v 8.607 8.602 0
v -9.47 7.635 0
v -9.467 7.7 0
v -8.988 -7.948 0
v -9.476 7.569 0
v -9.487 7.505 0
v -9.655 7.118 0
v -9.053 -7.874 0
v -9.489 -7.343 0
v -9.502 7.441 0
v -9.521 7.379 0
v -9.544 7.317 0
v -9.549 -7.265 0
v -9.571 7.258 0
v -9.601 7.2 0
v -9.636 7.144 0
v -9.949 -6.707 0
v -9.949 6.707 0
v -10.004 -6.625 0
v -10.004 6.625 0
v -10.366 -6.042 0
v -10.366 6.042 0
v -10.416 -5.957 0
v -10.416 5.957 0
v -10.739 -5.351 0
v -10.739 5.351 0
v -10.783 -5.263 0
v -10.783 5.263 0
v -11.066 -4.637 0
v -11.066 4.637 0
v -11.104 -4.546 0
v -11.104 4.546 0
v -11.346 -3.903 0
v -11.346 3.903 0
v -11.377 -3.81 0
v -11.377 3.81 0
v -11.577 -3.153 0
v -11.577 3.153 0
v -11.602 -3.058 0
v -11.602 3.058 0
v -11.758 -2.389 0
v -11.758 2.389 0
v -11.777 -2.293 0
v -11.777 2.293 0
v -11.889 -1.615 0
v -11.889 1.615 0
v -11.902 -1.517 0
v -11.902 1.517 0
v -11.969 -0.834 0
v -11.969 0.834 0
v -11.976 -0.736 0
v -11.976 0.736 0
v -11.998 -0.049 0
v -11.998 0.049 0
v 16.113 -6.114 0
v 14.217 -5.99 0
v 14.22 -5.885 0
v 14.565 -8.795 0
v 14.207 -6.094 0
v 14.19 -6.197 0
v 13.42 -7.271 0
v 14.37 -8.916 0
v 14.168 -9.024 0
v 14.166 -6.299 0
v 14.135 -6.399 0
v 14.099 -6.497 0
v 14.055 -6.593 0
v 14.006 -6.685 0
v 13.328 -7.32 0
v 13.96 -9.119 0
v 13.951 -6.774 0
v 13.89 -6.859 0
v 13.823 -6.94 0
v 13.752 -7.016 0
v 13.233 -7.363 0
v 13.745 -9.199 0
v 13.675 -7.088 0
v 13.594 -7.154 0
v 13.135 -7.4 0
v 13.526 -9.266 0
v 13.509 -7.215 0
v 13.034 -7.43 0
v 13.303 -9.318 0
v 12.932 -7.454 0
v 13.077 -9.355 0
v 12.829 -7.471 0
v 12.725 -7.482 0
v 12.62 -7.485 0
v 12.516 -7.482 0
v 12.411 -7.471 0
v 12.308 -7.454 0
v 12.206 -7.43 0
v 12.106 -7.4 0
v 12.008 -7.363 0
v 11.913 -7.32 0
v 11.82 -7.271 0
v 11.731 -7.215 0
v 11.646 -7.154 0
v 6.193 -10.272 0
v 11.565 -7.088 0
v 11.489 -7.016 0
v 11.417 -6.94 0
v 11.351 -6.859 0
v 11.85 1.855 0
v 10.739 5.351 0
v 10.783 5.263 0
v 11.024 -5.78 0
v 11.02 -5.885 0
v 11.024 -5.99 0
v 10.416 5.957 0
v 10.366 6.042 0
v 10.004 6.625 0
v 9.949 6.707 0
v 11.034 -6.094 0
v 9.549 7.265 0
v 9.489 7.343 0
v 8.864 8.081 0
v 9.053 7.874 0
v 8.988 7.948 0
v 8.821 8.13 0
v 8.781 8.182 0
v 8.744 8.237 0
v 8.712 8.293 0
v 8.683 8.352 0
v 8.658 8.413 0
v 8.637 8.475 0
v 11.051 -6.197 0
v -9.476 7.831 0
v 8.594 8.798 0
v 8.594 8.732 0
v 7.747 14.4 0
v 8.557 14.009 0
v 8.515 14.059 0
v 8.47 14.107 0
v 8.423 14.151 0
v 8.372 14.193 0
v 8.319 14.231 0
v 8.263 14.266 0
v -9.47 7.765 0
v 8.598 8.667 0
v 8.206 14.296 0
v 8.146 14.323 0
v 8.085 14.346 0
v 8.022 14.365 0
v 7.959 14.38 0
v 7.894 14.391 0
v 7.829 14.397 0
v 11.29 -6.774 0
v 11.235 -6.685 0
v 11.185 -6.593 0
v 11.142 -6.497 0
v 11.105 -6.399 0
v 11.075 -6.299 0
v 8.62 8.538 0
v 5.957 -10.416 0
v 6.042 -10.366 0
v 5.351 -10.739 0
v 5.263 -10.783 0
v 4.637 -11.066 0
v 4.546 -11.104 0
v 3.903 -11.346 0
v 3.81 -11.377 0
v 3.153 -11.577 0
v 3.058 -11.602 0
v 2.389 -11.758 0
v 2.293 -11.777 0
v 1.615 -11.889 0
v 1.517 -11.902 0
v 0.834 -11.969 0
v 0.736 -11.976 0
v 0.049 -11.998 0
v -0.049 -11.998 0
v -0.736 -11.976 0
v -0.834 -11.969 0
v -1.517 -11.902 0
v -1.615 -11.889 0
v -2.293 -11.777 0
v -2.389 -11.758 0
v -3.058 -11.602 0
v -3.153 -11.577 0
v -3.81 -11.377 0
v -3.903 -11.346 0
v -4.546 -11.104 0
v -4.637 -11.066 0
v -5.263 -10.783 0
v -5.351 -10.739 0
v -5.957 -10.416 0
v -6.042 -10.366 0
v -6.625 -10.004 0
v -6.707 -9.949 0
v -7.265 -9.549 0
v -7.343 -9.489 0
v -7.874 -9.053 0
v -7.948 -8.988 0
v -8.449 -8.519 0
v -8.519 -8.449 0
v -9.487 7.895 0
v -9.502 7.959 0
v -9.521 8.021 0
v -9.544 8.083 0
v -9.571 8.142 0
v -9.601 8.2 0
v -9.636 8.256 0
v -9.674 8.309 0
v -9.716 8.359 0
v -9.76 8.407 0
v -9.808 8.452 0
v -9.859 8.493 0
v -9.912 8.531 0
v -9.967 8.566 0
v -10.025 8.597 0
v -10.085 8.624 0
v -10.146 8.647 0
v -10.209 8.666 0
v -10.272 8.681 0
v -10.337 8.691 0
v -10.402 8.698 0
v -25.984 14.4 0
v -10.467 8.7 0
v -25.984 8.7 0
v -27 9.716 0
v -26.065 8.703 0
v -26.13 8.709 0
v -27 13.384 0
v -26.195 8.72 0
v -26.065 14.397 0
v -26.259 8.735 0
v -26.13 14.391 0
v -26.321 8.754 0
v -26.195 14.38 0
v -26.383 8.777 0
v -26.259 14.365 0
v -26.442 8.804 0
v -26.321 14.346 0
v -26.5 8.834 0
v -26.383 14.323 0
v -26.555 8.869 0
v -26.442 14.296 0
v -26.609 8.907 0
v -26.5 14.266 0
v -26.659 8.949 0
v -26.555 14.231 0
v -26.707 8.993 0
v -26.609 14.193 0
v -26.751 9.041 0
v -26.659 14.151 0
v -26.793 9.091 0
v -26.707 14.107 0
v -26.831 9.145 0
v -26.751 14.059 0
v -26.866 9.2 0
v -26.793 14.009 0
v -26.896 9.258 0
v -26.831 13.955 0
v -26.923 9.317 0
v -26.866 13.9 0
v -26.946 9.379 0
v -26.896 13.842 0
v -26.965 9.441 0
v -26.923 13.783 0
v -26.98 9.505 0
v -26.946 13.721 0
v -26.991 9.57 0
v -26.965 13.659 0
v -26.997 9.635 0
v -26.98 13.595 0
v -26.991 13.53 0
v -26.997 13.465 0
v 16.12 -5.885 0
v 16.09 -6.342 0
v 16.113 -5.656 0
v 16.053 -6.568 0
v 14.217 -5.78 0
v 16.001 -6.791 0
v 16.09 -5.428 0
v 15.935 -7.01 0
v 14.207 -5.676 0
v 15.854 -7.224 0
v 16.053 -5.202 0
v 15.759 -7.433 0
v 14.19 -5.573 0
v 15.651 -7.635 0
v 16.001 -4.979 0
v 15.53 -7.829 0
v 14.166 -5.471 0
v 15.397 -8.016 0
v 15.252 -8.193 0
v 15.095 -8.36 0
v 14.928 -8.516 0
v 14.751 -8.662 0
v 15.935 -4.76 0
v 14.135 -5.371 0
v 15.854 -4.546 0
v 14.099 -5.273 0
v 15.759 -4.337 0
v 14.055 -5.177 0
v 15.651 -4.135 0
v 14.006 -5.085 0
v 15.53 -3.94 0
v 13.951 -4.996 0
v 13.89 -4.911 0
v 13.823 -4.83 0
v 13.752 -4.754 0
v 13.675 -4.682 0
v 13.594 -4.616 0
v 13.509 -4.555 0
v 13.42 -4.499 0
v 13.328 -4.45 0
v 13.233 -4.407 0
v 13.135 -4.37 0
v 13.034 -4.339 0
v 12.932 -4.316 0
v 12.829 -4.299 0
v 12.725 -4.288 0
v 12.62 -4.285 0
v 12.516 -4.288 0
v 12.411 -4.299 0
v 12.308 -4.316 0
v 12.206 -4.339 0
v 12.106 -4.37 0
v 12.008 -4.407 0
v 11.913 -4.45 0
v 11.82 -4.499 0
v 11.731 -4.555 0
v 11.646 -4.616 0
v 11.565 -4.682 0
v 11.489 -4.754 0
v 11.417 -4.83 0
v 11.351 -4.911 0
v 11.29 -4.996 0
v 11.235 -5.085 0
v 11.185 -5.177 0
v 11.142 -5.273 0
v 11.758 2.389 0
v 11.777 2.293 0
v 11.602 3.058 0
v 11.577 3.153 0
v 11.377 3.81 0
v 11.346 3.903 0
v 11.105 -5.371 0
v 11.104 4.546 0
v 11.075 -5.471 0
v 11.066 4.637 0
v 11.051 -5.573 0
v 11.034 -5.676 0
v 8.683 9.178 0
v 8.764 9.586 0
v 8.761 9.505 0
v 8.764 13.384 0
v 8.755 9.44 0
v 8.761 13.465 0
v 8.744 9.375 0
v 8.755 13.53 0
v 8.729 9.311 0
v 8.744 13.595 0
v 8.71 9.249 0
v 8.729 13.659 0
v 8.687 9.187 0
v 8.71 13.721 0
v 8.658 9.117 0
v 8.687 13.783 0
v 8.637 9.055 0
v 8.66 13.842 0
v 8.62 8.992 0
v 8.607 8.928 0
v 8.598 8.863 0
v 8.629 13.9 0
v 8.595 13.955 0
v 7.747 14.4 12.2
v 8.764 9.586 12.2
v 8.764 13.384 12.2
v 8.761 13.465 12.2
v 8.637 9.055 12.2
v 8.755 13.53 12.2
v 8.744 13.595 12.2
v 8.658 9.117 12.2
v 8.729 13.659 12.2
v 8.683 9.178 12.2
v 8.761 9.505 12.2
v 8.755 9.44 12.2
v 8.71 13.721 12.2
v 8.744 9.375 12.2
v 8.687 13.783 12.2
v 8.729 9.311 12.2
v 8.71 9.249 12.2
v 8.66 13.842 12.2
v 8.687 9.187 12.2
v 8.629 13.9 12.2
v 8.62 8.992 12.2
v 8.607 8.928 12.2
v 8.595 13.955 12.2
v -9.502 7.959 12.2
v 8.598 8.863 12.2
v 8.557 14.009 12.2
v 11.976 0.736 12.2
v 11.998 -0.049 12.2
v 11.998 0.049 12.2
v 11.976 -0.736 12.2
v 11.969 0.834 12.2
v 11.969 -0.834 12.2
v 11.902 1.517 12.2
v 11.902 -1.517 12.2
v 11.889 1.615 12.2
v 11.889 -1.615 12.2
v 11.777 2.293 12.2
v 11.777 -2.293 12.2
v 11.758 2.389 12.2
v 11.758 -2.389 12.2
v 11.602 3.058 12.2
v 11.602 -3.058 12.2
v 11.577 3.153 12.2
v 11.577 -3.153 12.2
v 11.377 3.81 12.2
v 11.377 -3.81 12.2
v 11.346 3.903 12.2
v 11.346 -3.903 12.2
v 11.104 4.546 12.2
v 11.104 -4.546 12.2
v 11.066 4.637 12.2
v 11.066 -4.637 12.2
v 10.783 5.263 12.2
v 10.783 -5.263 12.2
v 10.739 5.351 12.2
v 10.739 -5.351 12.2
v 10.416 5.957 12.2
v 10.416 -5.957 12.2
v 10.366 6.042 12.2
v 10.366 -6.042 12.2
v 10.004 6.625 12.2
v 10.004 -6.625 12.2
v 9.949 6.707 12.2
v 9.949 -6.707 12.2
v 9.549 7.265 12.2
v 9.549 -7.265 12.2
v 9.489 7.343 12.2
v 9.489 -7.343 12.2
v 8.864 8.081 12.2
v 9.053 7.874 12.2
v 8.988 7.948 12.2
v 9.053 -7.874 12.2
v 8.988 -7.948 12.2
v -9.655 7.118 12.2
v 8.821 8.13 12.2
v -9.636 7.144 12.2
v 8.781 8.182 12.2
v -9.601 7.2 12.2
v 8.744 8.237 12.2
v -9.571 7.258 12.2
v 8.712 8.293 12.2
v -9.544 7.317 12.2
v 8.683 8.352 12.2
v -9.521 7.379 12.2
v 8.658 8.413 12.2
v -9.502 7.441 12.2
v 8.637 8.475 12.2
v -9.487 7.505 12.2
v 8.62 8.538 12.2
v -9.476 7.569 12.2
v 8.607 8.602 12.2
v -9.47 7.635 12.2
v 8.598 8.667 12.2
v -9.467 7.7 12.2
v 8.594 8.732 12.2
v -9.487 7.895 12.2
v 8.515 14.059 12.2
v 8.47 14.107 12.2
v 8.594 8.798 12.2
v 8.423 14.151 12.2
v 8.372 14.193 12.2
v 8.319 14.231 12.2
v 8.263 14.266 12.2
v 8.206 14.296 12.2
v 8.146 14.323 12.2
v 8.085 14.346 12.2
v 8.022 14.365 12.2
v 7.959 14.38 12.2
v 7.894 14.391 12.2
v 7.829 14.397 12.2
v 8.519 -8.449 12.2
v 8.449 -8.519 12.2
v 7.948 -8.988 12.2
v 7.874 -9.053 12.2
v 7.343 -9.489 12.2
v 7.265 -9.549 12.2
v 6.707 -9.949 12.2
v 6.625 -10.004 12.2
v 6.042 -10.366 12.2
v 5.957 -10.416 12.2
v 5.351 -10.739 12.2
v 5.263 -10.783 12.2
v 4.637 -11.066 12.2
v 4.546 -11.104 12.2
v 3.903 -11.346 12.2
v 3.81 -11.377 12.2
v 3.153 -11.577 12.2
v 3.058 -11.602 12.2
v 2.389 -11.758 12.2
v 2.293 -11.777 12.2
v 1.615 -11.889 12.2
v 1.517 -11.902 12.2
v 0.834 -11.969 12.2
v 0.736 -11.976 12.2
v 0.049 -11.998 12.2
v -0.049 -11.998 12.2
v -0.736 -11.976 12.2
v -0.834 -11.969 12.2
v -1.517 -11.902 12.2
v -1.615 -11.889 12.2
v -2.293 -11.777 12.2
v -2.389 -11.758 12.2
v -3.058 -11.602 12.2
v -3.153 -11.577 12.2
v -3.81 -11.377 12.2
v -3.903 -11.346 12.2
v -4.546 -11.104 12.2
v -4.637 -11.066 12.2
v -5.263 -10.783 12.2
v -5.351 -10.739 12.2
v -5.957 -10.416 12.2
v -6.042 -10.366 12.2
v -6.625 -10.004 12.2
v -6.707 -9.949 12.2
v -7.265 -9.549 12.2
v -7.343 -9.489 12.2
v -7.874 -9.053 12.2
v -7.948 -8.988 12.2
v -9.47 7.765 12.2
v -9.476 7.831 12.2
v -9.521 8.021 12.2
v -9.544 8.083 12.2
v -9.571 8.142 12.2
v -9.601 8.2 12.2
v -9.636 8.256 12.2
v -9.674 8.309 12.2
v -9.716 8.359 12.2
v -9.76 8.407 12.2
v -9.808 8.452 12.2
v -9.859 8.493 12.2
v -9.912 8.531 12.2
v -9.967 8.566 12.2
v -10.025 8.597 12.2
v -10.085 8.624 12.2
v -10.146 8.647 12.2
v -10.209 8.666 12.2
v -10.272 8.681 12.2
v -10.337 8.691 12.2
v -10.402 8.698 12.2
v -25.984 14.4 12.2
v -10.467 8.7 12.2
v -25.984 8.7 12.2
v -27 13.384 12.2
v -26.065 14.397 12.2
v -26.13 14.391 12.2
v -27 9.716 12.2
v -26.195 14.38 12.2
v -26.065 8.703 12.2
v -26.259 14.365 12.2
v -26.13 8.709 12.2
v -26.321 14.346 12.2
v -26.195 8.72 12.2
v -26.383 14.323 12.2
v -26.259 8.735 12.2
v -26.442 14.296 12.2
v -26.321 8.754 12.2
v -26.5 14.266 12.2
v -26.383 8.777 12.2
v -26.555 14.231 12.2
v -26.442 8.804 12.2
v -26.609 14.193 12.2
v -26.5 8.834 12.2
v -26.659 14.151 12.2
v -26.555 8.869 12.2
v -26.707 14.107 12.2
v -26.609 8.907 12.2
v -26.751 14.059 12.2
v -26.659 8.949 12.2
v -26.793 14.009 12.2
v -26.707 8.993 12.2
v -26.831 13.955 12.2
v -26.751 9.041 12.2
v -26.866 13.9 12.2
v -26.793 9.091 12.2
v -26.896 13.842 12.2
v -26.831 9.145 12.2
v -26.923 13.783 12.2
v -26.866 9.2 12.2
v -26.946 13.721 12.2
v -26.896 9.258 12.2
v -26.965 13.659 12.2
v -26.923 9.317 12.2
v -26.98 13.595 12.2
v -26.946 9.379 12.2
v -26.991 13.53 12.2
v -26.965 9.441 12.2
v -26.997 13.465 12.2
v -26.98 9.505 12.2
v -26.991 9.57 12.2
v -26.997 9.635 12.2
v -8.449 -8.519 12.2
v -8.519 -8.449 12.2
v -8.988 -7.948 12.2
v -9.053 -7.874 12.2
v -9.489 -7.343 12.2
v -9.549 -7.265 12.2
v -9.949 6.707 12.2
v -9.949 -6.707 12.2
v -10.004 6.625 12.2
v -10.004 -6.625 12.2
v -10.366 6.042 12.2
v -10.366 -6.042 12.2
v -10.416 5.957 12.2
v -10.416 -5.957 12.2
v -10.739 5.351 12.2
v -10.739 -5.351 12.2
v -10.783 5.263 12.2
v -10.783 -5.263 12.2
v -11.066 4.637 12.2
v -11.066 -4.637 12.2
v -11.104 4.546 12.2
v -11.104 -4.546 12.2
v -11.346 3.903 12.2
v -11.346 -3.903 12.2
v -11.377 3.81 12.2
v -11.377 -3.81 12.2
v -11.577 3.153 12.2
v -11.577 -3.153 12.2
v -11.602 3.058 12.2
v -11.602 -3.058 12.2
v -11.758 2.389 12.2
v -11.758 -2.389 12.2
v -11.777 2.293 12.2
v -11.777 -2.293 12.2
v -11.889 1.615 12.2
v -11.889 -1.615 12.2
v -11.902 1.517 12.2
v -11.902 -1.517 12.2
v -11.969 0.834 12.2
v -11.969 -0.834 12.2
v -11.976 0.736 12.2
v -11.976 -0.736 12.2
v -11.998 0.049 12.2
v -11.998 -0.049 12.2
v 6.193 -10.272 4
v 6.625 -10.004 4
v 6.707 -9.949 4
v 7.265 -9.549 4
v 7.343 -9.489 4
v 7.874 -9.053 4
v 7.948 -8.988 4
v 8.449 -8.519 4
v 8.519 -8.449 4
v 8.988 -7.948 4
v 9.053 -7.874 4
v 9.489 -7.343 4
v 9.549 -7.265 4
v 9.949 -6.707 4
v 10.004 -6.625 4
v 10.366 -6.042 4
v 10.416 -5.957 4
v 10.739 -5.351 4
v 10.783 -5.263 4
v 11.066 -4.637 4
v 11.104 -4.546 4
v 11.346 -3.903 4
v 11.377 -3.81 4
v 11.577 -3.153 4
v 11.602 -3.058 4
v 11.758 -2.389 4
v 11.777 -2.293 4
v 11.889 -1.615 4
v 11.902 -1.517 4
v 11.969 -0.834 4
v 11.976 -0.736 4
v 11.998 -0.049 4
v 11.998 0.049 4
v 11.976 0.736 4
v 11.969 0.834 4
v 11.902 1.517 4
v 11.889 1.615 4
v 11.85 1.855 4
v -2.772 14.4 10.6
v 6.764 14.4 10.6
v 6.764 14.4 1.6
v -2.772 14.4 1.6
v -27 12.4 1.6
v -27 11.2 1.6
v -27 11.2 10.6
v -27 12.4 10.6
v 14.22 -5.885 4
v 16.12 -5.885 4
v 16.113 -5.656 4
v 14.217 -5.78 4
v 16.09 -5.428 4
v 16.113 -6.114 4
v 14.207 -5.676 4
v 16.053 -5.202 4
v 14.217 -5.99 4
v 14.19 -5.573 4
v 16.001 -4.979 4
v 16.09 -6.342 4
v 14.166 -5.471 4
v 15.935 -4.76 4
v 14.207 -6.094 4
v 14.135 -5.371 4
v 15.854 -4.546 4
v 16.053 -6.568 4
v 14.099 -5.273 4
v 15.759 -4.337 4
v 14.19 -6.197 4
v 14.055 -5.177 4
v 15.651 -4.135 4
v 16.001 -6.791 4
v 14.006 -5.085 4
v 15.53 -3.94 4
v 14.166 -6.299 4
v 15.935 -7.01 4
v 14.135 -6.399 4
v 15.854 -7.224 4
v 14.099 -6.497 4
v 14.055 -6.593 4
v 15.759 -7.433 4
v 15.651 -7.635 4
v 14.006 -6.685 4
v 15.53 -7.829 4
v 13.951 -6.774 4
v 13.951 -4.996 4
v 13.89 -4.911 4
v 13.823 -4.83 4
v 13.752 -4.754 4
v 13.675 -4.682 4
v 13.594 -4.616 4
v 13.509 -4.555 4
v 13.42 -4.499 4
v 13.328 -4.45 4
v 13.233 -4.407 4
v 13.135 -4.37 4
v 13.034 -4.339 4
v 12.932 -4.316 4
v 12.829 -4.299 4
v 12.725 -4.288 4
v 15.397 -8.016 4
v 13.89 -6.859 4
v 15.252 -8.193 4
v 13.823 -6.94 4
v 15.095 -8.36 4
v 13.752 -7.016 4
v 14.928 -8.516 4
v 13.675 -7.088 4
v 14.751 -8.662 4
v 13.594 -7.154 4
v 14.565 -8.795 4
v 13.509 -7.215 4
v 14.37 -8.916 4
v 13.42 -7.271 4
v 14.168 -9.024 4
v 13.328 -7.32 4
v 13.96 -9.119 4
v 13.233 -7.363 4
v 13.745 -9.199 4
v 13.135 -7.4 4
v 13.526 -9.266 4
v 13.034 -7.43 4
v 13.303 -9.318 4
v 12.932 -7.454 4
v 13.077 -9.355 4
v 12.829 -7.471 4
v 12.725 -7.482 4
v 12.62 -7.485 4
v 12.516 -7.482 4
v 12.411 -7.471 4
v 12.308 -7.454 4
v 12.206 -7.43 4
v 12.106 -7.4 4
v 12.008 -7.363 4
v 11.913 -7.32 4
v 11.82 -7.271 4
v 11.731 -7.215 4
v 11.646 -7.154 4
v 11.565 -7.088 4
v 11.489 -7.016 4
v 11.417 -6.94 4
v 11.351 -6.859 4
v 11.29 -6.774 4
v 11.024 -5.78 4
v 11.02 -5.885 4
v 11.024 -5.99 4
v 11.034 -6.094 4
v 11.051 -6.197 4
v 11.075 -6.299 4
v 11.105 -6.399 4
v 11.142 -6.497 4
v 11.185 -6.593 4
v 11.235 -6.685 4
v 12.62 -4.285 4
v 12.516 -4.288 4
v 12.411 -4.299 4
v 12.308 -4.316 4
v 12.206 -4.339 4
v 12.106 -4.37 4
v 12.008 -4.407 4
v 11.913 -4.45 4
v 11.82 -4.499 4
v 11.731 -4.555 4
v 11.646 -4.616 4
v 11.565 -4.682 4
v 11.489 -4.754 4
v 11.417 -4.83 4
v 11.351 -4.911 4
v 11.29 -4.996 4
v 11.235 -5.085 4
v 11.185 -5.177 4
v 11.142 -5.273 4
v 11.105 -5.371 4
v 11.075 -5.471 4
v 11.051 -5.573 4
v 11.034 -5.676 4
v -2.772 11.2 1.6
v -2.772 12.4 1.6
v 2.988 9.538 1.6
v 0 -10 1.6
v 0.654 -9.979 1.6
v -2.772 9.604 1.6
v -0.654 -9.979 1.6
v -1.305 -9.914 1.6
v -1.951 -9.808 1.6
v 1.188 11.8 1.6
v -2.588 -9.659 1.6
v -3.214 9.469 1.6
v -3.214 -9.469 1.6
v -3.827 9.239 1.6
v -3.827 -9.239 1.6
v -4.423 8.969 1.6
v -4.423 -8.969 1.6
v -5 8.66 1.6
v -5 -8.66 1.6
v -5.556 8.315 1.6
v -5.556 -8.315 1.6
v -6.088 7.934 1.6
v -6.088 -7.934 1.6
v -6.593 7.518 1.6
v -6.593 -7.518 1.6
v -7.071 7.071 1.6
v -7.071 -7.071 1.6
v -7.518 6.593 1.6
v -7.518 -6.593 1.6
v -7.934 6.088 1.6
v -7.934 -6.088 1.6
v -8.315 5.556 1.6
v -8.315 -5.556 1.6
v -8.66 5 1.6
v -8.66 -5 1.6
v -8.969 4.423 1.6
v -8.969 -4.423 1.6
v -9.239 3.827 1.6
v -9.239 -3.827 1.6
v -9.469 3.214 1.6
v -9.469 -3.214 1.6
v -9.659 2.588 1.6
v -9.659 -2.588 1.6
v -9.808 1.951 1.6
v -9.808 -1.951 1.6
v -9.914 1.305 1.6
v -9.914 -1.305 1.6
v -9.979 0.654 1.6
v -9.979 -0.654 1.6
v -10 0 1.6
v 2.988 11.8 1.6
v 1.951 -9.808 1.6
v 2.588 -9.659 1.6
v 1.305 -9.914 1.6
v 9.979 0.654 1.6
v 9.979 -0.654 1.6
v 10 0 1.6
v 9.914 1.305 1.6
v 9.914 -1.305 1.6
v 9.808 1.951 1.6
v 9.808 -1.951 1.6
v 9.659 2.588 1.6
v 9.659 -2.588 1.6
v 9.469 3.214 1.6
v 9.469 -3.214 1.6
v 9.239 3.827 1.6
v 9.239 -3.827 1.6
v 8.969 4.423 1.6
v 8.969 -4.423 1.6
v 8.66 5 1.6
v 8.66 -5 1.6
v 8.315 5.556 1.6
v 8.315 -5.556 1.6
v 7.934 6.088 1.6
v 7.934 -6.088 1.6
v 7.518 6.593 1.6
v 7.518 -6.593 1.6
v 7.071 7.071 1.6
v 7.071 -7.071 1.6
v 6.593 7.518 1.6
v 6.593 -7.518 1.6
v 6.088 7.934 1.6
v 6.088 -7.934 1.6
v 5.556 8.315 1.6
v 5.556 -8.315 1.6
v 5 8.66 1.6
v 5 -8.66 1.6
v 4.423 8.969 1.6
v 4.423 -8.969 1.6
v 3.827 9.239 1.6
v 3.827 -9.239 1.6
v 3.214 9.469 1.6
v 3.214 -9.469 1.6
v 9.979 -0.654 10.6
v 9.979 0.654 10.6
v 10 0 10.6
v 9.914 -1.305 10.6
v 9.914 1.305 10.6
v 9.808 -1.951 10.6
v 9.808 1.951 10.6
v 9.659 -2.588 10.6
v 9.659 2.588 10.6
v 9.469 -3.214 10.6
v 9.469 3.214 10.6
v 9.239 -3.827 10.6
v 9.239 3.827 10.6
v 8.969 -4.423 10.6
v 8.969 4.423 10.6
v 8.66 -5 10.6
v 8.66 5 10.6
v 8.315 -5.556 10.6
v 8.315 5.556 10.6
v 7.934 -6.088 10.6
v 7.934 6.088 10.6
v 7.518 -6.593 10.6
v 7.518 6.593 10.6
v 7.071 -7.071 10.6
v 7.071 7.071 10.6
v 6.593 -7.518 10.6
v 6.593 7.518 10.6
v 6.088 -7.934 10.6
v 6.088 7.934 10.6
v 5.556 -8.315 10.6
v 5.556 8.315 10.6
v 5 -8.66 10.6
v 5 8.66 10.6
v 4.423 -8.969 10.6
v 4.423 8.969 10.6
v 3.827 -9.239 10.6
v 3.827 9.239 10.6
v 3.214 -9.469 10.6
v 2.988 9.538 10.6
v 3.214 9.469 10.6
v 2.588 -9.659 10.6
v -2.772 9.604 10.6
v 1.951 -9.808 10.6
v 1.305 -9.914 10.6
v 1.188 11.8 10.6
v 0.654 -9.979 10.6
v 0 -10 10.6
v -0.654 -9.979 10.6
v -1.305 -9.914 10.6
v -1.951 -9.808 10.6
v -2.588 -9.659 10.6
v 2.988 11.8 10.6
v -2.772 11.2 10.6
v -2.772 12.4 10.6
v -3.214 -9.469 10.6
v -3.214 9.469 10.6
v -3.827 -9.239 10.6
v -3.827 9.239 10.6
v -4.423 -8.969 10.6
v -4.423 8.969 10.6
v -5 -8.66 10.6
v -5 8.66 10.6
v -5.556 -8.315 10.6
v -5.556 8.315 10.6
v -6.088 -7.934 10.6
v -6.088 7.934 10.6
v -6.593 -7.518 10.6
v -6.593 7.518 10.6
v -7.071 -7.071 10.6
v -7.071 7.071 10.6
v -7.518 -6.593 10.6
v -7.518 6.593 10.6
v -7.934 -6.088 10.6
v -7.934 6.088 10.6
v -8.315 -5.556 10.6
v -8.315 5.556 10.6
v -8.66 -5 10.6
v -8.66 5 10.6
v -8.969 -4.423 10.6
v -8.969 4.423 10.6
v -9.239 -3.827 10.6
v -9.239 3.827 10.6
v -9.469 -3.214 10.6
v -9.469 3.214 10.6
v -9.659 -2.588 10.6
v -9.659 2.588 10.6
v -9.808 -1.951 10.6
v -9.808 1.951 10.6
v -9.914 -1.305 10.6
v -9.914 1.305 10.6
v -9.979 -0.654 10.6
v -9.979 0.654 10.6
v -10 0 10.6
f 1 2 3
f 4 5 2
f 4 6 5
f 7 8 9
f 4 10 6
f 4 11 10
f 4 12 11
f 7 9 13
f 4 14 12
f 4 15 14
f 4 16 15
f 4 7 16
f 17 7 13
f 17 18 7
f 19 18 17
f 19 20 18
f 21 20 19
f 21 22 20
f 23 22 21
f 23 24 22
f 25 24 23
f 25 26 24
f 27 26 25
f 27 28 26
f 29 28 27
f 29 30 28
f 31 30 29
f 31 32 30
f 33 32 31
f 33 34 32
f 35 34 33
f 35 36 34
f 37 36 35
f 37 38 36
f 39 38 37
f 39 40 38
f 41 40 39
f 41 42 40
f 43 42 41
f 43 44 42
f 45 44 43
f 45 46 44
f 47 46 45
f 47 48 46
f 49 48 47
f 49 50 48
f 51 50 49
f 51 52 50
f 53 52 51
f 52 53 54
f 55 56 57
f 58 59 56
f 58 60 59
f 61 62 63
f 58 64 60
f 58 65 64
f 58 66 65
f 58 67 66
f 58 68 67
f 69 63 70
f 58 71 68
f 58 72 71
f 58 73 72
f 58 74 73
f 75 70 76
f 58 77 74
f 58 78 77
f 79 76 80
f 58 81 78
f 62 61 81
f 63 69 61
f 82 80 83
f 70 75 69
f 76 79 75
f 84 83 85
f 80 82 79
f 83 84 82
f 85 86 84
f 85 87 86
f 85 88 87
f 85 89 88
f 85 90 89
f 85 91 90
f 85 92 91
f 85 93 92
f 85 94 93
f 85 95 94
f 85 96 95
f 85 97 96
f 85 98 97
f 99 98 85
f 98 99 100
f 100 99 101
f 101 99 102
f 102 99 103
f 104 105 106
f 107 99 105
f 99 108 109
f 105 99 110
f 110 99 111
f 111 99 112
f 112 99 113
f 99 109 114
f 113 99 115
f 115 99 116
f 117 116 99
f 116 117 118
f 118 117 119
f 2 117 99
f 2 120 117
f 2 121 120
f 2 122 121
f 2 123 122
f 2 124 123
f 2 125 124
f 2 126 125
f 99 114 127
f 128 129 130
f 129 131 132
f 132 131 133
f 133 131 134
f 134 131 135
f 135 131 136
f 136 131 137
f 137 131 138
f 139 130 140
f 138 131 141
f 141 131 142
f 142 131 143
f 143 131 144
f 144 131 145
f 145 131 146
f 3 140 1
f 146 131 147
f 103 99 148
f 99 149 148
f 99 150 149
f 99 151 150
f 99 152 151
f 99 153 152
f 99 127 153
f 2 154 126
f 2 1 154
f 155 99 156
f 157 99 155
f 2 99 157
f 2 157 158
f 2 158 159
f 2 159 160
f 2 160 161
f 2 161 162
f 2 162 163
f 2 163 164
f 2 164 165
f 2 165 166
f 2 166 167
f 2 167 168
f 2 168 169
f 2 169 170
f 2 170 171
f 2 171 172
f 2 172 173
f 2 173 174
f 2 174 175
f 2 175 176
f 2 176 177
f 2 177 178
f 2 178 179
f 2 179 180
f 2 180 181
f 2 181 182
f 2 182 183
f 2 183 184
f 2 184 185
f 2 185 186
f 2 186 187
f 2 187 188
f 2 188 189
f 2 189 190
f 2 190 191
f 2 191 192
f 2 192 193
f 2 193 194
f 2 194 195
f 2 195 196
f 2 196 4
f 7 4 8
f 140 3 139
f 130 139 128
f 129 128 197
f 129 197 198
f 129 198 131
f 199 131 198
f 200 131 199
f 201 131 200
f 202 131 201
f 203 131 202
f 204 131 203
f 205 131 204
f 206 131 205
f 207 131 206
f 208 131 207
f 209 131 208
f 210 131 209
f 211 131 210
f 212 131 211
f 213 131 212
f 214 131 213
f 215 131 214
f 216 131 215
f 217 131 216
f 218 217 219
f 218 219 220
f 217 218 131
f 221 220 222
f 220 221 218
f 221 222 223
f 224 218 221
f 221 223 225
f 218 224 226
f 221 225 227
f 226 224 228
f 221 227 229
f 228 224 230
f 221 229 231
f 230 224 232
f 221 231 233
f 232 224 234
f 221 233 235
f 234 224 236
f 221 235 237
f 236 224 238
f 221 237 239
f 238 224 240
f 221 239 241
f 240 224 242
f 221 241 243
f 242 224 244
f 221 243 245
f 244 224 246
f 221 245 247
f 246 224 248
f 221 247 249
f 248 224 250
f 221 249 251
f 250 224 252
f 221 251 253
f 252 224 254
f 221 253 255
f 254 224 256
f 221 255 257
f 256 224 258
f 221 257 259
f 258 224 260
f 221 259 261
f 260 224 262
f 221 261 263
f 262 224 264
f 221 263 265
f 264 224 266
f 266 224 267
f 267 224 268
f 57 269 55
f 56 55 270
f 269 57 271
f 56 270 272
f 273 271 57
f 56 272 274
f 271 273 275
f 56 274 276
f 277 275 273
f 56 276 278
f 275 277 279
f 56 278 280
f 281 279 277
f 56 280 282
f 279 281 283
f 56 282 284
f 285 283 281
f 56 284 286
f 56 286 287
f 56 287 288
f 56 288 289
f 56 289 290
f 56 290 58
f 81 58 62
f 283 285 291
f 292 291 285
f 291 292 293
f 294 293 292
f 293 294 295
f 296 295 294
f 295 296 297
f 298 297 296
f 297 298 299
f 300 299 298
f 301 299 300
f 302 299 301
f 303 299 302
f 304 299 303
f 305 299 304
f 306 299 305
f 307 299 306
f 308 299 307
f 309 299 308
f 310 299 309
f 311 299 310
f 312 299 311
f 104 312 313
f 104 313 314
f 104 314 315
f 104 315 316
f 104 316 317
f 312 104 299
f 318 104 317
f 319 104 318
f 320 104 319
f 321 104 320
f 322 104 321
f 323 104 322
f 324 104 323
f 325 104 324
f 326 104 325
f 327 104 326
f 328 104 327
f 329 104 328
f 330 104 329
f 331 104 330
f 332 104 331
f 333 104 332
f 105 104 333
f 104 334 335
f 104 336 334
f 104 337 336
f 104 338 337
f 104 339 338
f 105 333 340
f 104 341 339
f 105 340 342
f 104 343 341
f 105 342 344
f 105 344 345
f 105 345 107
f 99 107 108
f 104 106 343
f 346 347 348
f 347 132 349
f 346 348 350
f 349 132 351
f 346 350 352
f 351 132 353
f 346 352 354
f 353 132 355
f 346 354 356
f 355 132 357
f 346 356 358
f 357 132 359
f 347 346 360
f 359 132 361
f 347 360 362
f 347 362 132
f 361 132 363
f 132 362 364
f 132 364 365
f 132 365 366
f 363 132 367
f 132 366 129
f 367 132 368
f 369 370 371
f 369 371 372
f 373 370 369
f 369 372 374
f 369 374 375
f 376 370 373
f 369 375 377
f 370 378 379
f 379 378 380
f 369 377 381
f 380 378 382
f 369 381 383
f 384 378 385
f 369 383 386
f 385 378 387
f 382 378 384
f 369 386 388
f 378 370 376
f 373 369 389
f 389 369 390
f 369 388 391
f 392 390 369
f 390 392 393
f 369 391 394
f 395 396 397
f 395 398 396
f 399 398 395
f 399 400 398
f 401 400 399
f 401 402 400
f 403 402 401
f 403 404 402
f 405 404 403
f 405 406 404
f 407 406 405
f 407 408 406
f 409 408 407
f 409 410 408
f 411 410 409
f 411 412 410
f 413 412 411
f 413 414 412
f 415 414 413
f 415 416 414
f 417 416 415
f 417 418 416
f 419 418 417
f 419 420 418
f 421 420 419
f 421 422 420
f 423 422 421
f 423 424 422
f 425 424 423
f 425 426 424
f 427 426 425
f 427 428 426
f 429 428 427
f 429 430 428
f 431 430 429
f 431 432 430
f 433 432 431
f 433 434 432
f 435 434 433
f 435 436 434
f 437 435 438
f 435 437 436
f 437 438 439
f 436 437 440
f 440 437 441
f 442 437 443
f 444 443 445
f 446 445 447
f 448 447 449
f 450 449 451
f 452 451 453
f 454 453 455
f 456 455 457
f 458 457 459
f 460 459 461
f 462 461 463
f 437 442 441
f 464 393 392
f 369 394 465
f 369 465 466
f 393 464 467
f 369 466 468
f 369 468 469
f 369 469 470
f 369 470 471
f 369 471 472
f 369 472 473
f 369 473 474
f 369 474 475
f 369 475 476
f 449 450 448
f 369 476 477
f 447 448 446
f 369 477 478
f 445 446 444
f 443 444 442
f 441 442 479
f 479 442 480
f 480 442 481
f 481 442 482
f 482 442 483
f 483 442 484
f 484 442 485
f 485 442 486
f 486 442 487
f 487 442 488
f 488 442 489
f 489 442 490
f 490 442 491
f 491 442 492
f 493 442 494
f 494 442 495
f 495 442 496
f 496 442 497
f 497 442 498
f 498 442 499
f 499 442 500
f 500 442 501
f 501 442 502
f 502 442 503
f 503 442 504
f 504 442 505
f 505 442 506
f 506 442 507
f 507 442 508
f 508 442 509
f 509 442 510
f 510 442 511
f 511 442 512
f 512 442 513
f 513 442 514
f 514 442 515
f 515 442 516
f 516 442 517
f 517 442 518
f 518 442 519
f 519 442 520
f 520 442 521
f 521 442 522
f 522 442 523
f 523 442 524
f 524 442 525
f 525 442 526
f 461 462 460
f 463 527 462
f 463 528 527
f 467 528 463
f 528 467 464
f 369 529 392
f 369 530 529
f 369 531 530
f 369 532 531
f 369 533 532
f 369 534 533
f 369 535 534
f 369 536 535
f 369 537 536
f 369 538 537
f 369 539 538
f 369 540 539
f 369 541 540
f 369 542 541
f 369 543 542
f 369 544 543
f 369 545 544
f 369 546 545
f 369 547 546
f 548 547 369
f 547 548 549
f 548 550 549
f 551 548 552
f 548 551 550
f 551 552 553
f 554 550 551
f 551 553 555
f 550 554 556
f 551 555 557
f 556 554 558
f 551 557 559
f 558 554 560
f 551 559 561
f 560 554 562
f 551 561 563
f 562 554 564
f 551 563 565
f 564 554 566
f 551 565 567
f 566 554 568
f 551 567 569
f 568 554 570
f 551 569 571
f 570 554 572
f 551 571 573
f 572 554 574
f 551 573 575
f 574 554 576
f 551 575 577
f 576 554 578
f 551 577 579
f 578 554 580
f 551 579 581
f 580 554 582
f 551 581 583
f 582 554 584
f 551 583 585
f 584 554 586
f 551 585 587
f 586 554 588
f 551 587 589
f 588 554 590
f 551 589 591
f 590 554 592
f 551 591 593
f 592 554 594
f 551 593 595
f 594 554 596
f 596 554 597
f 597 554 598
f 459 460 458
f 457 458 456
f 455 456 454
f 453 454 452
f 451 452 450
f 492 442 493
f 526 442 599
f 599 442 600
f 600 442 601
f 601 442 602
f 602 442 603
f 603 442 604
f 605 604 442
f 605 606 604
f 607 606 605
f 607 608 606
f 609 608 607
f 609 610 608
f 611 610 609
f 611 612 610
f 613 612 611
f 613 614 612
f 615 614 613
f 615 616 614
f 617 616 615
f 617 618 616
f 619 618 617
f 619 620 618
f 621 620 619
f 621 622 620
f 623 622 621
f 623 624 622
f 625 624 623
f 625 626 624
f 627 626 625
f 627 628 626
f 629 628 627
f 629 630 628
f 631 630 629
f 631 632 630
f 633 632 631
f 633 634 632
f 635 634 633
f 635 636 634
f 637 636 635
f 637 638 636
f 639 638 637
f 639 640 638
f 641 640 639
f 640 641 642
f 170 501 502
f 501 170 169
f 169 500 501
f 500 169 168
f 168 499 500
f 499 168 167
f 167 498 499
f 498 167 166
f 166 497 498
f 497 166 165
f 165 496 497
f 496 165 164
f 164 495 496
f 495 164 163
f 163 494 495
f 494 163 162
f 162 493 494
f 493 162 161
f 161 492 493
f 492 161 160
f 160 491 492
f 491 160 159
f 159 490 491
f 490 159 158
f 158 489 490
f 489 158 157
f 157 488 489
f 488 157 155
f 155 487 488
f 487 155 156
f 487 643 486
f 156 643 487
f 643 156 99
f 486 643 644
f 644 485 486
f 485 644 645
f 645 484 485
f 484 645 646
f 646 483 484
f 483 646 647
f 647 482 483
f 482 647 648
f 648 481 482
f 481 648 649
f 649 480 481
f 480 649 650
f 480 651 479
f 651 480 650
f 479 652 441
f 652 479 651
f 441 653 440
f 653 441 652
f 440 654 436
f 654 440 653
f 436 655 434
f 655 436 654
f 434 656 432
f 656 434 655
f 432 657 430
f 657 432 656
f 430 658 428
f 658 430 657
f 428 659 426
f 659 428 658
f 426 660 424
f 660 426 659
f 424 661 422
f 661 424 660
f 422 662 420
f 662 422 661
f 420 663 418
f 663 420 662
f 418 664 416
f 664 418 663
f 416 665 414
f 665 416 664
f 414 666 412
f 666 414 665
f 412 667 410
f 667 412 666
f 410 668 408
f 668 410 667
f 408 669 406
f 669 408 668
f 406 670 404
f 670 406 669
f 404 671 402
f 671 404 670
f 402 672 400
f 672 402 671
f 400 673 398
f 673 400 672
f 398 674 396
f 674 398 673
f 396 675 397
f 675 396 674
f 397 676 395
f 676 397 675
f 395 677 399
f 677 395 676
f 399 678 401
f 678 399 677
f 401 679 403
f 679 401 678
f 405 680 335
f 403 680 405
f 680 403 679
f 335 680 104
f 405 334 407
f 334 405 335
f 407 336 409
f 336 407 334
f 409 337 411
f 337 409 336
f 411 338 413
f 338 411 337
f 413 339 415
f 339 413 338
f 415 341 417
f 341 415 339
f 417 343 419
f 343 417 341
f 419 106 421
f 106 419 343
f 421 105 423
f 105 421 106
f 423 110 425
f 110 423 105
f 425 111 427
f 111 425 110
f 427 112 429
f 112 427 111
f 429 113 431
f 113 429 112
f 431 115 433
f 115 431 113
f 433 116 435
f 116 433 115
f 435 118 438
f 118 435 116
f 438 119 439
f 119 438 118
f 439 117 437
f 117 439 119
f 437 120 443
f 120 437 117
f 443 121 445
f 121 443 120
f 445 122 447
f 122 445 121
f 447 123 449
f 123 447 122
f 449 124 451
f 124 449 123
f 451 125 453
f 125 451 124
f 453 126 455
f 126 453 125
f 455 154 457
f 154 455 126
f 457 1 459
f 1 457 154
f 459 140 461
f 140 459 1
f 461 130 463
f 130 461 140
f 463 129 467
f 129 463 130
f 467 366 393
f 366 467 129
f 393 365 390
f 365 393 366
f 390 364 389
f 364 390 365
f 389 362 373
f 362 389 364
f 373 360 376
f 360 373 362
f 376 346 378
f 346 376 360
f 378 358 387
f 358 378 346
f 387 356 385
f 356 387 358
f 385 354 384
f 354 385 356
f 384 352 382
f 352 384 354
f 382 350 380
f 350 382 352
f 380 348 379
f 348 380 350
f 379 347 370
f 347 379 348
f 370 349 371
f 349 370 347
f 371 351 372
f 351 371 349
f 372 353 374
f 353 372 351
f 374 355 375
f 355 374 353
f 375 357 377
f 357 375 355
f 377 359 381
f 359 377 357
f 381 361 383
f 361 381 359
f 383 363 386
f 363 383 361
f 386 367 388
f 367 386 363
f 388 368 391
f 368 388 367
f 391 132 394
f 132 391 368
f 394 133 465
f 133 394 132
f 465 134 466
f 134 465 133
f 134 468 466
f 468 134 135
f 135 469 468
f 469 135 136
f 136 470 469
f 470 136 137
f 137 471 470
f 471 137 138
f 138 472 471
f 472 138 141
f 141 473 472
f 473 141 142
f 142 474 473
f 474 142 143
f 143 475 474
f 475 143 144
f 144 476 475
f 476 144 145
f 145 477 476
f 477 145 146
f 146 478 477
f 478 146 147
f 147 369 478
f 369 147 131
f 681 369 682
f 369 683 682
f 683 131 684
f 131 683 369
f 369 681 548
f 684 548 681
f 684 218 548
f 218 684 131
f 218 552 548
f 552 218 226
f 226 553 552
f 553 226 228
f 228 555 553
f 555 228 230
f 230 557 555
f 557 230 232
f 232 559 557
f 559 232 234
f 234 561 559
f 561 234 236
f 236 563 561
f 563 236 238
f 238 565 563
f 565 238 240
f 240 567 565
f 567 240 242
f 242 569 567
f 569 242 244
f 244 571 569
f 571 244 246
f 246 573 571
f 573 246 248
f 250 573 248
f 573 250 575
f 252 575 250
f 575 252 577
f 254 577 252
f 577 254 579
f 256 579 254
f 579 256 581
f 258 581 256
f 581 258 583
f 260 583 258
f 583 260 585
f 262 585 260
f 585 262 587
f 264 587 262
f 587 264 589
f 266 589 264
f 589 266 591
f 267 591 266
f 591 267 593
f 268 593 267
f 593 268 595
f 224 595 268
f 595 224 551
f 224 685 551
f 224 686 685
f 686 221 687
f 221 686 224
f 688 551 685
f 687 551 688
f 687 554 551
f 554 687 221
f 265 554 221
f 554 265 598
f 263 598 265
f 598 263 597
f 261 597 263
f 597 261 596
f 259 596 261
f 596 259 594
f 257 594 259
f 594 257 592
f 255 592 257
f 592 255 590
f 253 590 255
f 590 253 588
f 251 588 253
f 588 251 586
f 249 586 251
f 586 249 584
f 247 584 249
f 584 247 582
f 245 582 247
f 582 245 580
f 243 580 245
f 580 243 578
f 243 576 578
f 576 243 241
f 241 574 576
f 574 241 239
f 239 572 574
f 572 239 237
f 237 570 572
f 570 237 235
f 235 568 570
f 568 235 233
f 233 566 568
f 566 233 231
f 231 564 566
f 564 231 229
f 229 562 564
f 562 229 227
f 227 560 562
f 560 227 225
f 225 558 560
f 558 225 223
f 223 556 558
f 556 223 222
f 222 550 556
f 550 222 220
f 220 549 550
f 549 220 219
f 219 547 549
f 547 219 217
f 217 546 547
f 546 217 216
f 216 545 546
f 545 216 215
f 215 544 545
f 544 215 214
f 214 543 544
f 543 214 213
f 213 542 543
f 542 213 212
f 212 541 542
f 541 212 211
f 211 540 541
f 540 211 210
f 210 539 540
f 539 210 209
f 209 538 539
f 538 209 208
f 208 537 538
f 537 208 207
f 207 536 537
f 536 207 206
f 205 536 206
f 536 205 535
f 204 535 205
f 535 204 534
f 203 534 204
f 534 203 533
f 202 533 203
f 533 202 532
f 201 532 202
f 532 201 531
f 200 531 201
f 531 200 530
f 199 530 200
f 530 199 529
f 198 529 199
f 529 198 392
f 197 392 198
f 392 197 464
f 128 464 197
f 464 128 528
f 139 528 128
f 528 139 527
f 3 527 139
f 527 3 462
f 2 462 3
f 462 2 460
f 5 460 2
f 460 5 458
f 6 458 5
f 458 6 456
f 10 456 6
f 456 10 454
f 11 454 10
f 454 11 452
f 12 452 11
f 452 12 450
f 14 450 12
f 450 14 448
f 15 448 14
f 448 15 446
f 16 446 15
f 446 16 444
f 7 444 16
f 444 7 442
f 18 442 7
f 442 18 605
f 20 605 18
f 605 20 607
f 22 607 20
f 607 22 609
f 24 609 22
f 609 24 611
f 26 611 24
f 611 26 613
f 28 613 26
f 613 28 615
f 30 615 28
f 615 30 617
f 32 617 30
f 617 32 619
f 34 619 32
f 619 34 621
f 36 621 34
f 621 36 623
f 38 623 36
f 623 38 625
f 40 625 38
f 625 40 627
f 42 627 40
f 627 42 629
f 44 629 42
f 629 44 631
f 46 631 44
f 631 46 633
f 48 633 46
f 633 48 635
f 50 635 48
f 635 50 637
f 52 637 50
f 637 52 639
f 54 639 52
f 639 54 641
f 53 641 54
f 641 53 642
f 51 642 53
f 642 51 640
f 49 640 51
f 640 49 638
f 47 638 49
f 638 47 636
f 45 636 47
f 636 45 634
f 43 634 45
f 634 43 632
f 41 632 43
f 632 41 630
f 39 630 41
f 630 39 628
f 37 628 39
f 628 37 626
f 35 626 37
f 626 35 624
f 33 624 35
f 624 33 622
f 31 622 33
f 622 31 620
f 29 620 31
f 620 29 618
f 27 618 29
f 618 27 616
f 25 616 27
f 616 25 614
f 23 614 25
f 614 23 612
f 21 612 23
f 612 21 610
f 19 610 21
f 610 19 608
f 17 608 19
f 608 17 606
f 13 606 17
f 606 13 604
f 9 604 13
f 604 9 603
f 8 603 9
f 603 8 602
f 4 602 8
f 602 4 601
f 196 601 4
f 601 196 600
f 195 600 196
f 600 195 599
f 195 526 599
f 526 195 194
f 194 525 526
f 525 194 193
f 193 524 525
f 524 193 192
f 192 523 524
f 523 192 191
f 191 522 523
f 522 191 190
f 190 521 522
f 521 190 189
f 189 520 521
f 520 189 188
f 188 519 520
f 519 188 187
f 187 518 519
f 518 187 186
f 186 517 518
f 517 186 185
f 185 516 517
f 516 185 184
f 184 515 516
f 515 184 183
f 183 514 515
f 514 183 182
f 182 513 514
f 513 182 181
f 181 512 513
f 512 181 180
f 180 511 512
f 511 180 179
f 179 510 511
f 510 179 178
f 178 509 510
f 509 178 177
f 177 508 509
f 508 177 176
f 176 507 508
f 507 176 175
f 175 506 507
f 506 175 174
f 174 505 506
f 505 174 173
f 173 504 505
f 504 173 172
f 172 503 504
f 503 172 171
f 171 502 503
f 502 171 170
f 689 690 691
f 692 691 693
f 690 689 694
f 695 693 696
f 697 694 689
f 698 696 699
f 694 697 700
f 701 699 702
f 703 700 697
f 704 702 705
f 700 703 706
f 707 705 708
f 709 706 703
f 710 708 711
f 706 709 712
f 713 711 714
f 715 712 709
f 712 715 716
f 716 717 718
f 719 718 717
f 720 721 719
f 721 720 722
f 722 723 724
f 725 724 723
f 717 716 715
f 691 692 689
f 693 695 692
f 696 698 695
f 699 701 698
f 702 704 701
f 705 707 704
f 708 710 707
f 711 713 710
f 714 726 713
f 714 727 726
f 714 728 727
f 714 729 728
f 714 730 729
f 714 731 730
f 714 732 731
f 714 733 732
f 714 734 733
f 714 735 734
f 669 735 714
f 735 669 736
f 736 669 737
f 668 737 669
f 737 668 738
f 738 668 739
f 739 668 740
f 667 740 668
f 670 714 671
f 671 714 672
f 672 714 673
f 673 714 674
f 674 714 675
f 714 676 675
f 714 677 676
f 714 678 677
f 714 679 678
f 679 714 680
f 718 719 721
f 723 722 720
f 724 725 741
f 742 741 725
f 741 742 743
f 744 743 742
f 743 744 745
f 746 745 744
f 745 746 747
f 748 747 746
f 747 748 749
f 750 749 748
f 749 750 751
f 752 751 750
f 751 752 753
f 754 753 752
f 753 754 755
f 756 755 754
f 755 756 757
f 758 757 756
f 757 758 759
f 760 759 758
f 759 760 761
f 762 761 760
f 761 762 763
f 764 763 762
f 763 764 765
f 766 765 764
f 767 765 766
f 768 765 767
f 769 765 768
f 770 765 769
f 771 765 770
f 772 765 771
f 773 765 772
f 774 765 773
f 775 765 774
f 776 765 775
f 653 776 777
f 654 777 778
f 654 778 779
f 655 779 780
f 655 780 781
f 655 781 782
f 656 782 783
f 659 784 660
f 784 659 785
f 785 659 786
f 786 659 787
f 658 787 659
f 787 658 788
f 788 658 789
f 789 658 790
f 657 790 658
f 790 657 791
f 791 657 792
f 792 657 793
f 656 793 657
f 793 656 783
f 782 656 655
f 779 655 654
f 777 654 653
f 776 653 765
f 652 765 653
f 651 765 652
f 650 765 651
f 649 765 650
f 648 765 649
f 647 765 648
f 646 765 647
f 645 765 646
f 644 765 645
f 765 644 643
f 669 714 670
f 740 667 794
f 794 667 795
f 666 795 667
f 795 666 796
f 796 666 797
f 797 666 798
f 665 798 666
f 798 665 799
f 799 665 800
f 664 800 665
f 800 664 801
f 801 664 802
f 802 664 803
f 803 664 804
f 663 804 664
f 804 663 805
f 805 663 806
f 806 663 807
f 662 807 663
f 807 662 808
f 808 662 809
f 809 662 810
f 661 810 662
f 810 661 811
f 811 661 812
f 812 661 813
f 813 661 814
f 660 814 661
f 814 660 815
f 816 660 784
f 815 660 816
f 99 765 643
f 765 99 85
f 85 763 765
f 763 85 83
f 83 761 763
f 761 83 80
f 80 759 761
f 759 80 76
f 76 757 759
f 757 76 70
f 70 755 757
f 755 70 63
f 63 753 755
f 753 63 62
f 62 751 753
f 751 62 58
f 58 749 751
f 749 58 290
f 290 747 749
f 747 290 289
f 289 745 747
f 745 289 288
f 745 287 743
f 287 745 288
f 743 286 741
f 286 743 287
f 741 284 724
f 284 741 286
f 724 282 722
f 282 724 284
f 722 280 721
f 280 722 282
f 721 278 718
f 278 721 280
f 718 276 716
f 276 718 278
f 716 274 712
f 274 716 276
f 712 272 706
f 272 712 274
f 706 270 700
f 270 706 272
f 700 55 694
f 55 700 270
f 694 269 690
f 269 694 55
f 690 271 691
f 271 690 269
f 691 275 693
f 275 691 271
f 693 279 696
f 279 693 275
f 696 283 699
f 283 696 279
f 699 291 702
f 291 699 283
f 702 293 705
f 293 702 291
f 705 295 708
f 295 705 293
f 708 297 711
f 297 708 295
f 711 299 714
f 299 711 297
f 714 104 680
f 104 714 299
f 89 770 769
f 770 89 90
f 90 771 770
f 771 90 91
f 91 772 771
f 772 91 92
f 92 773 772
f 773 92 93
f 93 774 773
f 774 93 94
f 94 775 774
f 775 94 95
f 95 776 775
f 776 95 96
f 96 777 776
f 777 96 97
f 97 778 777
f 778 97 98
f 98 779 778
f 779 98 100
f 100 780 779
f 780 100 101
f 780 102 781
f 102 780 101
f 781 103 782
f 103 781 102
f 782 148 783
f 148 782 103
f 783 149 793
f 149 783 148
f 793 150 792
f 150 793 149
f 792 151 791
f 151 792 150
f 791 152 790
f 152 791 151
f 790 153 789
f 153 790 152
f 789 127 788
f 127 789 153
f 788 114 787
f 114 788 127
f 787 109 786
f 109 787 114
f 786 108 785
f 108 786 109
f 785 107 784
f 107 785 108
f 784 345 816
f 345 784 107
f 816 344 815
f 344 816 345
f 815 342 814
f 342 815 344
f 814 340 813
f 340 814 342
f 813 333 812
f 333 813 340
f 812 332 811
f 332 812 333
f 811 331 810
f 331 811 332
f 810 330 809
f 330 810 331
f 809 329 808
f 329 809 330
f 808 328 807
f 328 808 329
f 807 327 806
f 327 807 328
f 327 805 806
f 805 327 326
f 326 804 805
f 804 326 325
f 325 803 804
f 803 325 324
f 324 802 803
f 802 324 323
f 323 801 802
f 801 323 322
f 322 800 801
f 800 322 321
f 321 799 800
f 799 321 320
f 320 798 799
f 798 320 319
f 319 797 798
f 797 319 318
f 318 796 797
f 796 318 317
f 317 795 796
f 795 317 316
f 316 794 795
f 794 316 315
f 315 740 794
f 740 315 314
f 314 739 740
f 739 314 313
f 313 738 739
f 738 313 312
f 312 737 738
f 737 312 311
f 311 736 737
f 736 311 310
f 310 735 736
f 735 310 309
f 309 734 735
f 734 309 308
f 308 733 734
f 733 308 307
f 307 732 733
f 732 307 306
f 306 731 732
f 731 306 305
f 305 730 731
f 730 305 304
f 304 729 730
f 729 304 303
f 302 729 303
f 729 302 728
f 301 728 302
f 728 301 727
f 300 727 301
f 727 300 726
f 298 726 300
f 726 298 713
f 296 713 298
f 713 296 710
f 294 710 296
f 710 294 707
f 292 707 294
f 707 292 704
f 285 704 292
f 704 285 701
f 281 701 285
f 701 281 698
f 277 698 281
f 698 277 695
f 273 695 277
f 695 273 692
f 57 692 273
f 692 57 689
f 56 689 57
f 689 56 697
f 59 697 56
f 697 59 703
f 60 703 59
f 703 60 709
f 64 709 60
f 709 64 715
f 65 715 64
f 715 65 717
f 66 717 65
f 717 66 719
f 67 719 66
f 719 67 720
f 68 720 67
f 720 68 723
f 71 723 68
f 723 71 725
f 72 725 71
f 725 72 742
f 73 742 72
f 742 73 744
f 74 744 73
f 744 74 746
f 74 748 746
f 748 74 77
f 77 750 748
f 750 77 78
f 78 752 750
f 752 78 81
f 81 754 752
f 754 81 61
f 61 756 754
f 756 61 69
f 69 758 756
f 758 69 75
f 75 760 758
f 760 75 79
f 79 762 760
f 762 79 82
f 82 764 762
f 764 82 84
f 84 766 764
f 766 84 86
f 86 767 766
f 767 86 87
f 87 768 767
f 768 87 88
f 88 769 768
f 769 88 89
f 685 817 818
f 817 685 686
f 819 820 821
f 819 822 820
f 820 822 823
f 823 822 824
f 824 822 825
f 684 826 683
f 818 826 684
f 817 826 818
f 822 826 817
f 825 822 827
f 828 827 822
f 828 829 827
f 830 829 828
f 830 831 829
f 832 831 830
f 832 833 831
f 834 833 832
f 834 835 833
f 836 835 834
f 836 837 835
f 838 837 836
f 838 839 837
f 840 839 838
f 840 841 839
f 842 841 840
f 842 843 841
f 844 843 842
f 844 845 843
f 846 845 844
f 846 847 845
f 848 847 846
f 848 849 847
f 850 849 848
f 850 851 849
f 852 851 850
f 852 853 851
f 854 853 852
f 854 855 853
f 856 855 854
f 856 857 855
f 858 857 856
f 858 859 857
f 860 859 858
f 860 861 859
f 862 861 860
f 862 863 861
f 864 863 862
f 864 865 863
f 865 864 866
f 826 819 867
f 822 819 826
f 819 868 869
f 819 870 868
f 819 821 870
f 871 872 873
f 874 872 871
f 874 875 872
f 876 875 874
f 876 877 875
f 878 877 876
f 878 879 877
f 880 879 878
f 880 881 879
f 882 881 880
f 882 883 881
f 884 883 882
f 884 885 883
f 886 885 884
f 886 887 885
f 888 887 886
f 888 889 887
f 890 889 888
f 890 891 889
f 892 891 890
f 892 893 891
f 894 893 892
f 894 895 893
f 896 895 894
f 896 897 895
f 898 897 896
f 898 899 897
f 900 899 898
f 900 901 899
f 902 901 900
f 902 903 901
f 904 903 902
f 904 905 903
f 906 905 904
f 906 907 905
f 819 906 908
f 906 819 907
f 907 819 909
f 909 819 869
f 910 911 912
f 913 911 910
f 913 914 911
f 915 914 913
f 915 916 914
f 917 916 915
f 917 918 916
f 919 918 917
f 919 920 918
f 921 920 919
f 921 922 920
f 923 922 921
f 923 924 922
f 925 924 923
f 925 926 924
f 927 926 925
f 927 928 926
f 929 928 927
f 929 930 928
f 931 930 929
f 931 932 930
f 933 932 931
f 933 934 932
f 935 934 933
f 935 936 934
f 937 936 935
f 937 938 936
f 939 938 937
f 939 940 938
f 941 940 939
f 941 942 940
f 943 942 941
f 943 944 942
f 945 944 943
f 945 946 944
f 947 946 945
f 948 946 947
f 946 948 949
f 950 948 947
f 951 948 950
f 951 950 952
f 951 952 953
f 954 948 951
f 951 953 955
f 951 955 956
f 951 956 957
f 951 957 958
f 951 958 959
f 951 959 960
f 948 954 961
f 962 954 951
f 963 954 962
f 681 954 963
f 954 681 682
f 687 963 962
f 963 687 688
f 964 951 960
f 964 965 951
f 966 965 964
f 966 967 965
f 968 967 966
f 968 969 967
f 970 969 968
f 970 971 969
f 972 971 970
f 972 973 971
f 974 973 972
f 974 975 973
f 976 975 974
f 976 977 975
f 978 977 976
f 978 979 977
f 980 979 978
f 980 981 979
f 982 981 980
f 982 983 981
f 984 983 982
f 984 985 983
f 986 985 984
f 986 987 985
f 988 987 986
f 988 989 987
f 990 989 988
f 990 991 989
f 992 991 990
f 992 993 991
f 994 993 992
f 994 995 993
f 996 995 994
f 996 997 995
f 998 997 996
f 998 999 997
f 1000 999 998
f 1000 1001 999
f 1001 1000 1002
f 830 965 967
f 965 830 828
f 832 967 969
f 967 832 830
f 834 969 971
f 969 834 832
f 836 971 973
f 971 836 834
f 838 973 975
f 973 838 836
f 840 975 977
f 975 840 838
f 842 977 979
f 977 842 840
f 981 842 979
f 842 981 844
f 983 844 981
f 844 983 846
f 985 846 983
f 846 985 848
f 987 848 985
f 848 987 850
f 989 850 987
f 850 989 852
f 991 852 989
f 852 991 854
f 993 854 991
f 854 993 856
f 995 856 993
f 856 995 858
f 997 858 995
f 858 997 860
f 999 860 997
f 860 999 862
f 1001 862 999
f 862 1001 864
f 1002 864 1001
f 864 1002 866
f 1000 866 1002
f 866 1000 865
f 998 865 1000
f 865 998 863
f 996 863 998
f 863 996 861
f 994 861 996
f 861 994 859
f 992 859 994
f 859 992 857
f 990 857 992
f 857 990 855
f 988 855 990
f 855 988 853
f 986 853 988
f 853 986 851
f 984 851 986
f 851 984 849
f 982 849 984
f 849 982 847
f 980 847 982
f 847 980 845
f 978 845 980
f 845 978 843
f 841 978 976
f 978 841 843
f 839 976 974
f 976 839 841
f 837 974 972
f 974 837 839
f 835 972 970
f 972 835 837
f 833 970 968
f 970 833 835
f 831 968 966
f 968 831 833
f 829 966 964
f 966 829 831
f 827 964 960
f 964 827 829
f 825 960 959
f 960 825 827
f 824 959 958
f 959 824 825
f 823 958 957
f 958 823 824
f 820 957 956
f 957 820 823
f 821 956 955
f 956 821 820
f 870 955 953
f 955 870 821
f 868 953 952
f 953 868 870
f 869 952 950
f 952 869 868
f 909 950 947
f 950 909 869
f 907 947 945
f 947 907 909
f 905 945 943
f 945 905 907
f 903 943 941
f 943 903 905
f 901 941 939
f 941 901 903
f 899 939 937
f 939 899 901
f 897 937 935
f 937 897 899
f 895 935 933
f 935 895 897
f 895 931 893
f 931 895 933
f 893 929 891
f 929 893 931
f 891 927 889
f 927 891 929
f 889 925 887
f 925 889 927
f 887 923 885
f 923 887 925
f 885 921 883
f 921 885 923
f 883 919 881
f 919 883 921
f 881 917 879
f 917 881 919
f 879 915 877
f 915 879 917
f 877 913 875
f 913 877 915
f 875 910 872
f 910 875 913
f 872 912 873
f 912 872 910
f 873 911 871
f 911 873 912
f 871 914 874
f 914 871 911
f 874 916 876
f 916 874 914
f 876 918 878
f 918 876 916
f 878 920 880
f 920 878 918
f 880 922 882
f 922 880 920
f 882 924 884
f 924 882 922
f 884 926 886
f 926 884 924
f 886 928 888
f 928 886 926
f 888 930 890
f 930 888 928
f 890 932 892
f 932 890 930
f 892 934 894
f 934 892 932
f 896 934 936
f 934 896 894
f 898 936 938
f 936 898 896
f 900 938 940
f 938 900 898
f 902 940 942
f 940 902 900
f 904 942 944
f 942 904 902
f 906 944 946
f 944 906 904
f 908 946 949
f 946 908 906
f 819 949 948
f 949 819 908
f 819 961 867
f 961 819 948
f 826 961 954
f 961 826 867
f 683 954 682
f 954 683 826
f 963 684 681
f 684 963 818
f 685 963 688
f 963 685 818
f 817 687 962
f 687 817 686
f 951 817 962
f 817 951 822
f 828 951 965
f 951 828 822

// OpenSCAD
// Whistle — a pea-less referee-style whistle that prints lying on its side.
//
// It works like a Helmholtz resonator driven by an edge tone: breath goes down
// a flat windway about 1.2 mm high, crosses an open window, and splits on a
// sharp labium edge. Half the jet spills out of the window and half goes into
// the round chamber, and the chamber's air springs it back — that oscillation
// is the note.
//
// Printed on its side, the whole whistle is one 2D profile extruded straight
// up, closed by a floor and a roof:
//   - the windway's 1.2 mm height lies in the XY plane, where the printer is
//     most accurate, and its walls are vertical, so no overhang can sag into
//     it and close it;
//   - the labium edge is a vertical edge drawn by the nozzle, not a layer step;
//   - the only unsupported spans are flat bridges: the roof over the chamber,
//     the windway and the window.
//
// Written to the MakerWorld Parametric Model Maker customizer conventions so
// the same file works unchanged on MakerWorld and in ScadBuddy.
//
// The colour parameters are the extruder order: whistle_color is extruder 1,
// text_color extruder 2.

/* [Whistle] */

// Body shape
style = "classic_referee"; // [classic_referee:Classic referee, round_chamber:Round pebble, keychain_mini:Keychain mini]

// Scale factor (1 = a 43 mm long classic whistle); the windway never goes below 1 mm high
size = 1; // [0.8:0.1:1.5]

// Lanyard loop at the back of the chamber
loop = true;

/* [Decor] */

// Name inlaid in the upper side, over the chamber (leave empty for none; it shrinks to fit, so about 6 letters stay legible, fewer on the mini)
name = ""; // 12

// Typeface
font = "DejaVu Sans:style=Bold"; // font

/* [Colors] */

// Whistle colour (extruder 1)
whistle_color = "#FF7043"; // color

// Name colour (extruder 2)
text_color = "#FFFFFF"; // color

/* [Hidden] */

$fn = 96;

// Per style at size 1: chamber radius, internal width (the windway's and the
// window's width, across the layers), mouthpiece reach from the chamber
// centre, windway height, wall thickness.
//                         Rc    wi   Lm   hw   t
spec = style == "round_chamber" ? [11,  9,   24, 1.2, 2.0]
     : style == "keychain_mini" ? [6.5, 6,   16, 1.0, 1.6]
     :                            [10,  9,   27, 1.2, 2.0];

s = size;
Rc = spec[0] * s;                          // chamber radius (inside)
wi = spec[1] * s;                          // internal width
Lm = spec[2] * s;                          // mouth end, from the chamber centre
hw = max(1, spec[3] * s);                  // windway height: never below 1 mm
t = max(1.6, spec[4] * s);                 // outer walls in the profile
ws = max(1.6, 1.6 * s);                    // floor and roof (the flat sides)
fl = max(1.2, 1.2 * s);                    // wall between windway and chamber
tm = max(2, 2.5 * s);                      // material under the windway
Wz = wi + 2 * ws;                          // overall thickness, as printed

// Window (windway exit to labium edge) about 3.3 windway heights long, and a
// 25-degree bevel on the labium's outer face.
Lw = max(3, 3.3 * hw);
bevel = 25;

y_f = Rc + fl;                             // windway floor
y_e = y_f + hw / 2;                        // labium edge, on the jet's centre line
top = y_f + hw + t;                        // top of the mouthpiece
x_l = Lw * 0.3;                            // labium edge
x_w = x_l - Lw;                            // windway exit
ramp = (top - y_e) / tan(bevel);           // run of the labium bevel
k = 1.5 * hw;                              // flat underside of the labium
x_r = x_l + ramp + 2;                      // back end of the mouthpiece block

// Lanyard loop, on the back of the chamber, a little below centre.
loop_r = max(3, 3.5 * s);
loop_hole = max(3, 3.2 * s);
loop_a = -25;
loop_c = (Rc + t + loop_r * 0.55) * [cos(loop_a), sin(loop_a)];
loop_h = min(Wz, max(3, 4 * s));

inlay = 0.6;

// ---------------------------------------------------------------- profile

module mouthpiece_2d() {
    translate([-Lm, y_f - tm]) square([x_r + Lm, top - (y_f - tm)]);
}

// Corners rounded to 1 mm, outside and in.
module body_2d() {
    offset(r = -1) offset(r = 2) offset(r = -1)
        if (style == "round_chamber") hull() { circle(r = Rc + t); mouthpiece_2d(); }
        else union() { circle(r = Rc + t); mouthpiece_2d(); }
}

module loop_2d() {
    difference() {
        hull() {
            translate(loop_c) circle(r = loop_r);
            circle(r = Rc + t - 1);
        }
        translate(loop_c) circle(d = loop_hole);
    }
}

// Window: open to the outside above the jet, from the windway exit to the
// labium edge and up the labium's bevel.
module window_2d() {
    polygon([[x_w, y_f], [x_l, y_f], [x_l, y_e],
             [x_l + (top + 1 - y_e) / tan(bevel), top + 1], [x_w, top + 1]]);
}

// Everything hollow between the floor and the roof.
module cavity_2d() {
    circle(r = Rc);
    // Windway, through the mouth end.
    translate([-Lm - 1, y_f]) square([x_w + Lm + 1, hw]);
    // Throat under the jet, joining the window to the chamber, with the
    // labium's flat underside at the edge height.
    translate([x_w, Rc - 3]) square([x_l + k - x_w, y_e - (Rc - 3)]);
    window_2d();
}

// ---------------------------------------------------------------- name

// Shrink-only fit: resize() to the box of the text plus a hair-thin bar of the
// target length, so text already smaller is left alone.
module fit_x(w) {
    projection(cut = true) translate([0, 0, -0.5])
        resize([w, 0, 0], auto = [false, true, false])
            union() {
                linear_extrude(1) children();
                translate([-w / 2, 0, 10]) cube([w, 0.01, 0.01]);
            }
}

// The name shrinks to the chord of the chamber's flat side (1.5 mm in from
// its edge) across the letters' height.
name_size = 0.5 * Rc;
name_w = 2 * sqrt(pow(Rc + t - 1.5, 2) - pow(name_size / 2, 2));
module name_2d() {
    if (len(name) > 0)
        intersection() {
            fit_x(name_w)
                text(name, size = name_size, font = font, halign = "center", valign = "center");
            offset(delta = -1.5) difference() { body_2d(); window_2d(); }
        }
}

// ---------------------------------------------------------------- whistle

color(whistle_color) difference() {
    union() {
        linear_extrude(Wz) body_2d();
        if (loop) linear_extrude(loop_h) loop_2d();
    }
    translate([0, 0, ws]) linear_extrude(wi) cavity_2d();
    if (len(name) > 0) translate([0, 0, Wz - inlay]) linear_extrude(inlay + 1) name_2d();
}

if (len(name) > 0)
    color(text_color) translate([0, 0, Wz - inlay]) linear_extrude(inlay) name_2d();
